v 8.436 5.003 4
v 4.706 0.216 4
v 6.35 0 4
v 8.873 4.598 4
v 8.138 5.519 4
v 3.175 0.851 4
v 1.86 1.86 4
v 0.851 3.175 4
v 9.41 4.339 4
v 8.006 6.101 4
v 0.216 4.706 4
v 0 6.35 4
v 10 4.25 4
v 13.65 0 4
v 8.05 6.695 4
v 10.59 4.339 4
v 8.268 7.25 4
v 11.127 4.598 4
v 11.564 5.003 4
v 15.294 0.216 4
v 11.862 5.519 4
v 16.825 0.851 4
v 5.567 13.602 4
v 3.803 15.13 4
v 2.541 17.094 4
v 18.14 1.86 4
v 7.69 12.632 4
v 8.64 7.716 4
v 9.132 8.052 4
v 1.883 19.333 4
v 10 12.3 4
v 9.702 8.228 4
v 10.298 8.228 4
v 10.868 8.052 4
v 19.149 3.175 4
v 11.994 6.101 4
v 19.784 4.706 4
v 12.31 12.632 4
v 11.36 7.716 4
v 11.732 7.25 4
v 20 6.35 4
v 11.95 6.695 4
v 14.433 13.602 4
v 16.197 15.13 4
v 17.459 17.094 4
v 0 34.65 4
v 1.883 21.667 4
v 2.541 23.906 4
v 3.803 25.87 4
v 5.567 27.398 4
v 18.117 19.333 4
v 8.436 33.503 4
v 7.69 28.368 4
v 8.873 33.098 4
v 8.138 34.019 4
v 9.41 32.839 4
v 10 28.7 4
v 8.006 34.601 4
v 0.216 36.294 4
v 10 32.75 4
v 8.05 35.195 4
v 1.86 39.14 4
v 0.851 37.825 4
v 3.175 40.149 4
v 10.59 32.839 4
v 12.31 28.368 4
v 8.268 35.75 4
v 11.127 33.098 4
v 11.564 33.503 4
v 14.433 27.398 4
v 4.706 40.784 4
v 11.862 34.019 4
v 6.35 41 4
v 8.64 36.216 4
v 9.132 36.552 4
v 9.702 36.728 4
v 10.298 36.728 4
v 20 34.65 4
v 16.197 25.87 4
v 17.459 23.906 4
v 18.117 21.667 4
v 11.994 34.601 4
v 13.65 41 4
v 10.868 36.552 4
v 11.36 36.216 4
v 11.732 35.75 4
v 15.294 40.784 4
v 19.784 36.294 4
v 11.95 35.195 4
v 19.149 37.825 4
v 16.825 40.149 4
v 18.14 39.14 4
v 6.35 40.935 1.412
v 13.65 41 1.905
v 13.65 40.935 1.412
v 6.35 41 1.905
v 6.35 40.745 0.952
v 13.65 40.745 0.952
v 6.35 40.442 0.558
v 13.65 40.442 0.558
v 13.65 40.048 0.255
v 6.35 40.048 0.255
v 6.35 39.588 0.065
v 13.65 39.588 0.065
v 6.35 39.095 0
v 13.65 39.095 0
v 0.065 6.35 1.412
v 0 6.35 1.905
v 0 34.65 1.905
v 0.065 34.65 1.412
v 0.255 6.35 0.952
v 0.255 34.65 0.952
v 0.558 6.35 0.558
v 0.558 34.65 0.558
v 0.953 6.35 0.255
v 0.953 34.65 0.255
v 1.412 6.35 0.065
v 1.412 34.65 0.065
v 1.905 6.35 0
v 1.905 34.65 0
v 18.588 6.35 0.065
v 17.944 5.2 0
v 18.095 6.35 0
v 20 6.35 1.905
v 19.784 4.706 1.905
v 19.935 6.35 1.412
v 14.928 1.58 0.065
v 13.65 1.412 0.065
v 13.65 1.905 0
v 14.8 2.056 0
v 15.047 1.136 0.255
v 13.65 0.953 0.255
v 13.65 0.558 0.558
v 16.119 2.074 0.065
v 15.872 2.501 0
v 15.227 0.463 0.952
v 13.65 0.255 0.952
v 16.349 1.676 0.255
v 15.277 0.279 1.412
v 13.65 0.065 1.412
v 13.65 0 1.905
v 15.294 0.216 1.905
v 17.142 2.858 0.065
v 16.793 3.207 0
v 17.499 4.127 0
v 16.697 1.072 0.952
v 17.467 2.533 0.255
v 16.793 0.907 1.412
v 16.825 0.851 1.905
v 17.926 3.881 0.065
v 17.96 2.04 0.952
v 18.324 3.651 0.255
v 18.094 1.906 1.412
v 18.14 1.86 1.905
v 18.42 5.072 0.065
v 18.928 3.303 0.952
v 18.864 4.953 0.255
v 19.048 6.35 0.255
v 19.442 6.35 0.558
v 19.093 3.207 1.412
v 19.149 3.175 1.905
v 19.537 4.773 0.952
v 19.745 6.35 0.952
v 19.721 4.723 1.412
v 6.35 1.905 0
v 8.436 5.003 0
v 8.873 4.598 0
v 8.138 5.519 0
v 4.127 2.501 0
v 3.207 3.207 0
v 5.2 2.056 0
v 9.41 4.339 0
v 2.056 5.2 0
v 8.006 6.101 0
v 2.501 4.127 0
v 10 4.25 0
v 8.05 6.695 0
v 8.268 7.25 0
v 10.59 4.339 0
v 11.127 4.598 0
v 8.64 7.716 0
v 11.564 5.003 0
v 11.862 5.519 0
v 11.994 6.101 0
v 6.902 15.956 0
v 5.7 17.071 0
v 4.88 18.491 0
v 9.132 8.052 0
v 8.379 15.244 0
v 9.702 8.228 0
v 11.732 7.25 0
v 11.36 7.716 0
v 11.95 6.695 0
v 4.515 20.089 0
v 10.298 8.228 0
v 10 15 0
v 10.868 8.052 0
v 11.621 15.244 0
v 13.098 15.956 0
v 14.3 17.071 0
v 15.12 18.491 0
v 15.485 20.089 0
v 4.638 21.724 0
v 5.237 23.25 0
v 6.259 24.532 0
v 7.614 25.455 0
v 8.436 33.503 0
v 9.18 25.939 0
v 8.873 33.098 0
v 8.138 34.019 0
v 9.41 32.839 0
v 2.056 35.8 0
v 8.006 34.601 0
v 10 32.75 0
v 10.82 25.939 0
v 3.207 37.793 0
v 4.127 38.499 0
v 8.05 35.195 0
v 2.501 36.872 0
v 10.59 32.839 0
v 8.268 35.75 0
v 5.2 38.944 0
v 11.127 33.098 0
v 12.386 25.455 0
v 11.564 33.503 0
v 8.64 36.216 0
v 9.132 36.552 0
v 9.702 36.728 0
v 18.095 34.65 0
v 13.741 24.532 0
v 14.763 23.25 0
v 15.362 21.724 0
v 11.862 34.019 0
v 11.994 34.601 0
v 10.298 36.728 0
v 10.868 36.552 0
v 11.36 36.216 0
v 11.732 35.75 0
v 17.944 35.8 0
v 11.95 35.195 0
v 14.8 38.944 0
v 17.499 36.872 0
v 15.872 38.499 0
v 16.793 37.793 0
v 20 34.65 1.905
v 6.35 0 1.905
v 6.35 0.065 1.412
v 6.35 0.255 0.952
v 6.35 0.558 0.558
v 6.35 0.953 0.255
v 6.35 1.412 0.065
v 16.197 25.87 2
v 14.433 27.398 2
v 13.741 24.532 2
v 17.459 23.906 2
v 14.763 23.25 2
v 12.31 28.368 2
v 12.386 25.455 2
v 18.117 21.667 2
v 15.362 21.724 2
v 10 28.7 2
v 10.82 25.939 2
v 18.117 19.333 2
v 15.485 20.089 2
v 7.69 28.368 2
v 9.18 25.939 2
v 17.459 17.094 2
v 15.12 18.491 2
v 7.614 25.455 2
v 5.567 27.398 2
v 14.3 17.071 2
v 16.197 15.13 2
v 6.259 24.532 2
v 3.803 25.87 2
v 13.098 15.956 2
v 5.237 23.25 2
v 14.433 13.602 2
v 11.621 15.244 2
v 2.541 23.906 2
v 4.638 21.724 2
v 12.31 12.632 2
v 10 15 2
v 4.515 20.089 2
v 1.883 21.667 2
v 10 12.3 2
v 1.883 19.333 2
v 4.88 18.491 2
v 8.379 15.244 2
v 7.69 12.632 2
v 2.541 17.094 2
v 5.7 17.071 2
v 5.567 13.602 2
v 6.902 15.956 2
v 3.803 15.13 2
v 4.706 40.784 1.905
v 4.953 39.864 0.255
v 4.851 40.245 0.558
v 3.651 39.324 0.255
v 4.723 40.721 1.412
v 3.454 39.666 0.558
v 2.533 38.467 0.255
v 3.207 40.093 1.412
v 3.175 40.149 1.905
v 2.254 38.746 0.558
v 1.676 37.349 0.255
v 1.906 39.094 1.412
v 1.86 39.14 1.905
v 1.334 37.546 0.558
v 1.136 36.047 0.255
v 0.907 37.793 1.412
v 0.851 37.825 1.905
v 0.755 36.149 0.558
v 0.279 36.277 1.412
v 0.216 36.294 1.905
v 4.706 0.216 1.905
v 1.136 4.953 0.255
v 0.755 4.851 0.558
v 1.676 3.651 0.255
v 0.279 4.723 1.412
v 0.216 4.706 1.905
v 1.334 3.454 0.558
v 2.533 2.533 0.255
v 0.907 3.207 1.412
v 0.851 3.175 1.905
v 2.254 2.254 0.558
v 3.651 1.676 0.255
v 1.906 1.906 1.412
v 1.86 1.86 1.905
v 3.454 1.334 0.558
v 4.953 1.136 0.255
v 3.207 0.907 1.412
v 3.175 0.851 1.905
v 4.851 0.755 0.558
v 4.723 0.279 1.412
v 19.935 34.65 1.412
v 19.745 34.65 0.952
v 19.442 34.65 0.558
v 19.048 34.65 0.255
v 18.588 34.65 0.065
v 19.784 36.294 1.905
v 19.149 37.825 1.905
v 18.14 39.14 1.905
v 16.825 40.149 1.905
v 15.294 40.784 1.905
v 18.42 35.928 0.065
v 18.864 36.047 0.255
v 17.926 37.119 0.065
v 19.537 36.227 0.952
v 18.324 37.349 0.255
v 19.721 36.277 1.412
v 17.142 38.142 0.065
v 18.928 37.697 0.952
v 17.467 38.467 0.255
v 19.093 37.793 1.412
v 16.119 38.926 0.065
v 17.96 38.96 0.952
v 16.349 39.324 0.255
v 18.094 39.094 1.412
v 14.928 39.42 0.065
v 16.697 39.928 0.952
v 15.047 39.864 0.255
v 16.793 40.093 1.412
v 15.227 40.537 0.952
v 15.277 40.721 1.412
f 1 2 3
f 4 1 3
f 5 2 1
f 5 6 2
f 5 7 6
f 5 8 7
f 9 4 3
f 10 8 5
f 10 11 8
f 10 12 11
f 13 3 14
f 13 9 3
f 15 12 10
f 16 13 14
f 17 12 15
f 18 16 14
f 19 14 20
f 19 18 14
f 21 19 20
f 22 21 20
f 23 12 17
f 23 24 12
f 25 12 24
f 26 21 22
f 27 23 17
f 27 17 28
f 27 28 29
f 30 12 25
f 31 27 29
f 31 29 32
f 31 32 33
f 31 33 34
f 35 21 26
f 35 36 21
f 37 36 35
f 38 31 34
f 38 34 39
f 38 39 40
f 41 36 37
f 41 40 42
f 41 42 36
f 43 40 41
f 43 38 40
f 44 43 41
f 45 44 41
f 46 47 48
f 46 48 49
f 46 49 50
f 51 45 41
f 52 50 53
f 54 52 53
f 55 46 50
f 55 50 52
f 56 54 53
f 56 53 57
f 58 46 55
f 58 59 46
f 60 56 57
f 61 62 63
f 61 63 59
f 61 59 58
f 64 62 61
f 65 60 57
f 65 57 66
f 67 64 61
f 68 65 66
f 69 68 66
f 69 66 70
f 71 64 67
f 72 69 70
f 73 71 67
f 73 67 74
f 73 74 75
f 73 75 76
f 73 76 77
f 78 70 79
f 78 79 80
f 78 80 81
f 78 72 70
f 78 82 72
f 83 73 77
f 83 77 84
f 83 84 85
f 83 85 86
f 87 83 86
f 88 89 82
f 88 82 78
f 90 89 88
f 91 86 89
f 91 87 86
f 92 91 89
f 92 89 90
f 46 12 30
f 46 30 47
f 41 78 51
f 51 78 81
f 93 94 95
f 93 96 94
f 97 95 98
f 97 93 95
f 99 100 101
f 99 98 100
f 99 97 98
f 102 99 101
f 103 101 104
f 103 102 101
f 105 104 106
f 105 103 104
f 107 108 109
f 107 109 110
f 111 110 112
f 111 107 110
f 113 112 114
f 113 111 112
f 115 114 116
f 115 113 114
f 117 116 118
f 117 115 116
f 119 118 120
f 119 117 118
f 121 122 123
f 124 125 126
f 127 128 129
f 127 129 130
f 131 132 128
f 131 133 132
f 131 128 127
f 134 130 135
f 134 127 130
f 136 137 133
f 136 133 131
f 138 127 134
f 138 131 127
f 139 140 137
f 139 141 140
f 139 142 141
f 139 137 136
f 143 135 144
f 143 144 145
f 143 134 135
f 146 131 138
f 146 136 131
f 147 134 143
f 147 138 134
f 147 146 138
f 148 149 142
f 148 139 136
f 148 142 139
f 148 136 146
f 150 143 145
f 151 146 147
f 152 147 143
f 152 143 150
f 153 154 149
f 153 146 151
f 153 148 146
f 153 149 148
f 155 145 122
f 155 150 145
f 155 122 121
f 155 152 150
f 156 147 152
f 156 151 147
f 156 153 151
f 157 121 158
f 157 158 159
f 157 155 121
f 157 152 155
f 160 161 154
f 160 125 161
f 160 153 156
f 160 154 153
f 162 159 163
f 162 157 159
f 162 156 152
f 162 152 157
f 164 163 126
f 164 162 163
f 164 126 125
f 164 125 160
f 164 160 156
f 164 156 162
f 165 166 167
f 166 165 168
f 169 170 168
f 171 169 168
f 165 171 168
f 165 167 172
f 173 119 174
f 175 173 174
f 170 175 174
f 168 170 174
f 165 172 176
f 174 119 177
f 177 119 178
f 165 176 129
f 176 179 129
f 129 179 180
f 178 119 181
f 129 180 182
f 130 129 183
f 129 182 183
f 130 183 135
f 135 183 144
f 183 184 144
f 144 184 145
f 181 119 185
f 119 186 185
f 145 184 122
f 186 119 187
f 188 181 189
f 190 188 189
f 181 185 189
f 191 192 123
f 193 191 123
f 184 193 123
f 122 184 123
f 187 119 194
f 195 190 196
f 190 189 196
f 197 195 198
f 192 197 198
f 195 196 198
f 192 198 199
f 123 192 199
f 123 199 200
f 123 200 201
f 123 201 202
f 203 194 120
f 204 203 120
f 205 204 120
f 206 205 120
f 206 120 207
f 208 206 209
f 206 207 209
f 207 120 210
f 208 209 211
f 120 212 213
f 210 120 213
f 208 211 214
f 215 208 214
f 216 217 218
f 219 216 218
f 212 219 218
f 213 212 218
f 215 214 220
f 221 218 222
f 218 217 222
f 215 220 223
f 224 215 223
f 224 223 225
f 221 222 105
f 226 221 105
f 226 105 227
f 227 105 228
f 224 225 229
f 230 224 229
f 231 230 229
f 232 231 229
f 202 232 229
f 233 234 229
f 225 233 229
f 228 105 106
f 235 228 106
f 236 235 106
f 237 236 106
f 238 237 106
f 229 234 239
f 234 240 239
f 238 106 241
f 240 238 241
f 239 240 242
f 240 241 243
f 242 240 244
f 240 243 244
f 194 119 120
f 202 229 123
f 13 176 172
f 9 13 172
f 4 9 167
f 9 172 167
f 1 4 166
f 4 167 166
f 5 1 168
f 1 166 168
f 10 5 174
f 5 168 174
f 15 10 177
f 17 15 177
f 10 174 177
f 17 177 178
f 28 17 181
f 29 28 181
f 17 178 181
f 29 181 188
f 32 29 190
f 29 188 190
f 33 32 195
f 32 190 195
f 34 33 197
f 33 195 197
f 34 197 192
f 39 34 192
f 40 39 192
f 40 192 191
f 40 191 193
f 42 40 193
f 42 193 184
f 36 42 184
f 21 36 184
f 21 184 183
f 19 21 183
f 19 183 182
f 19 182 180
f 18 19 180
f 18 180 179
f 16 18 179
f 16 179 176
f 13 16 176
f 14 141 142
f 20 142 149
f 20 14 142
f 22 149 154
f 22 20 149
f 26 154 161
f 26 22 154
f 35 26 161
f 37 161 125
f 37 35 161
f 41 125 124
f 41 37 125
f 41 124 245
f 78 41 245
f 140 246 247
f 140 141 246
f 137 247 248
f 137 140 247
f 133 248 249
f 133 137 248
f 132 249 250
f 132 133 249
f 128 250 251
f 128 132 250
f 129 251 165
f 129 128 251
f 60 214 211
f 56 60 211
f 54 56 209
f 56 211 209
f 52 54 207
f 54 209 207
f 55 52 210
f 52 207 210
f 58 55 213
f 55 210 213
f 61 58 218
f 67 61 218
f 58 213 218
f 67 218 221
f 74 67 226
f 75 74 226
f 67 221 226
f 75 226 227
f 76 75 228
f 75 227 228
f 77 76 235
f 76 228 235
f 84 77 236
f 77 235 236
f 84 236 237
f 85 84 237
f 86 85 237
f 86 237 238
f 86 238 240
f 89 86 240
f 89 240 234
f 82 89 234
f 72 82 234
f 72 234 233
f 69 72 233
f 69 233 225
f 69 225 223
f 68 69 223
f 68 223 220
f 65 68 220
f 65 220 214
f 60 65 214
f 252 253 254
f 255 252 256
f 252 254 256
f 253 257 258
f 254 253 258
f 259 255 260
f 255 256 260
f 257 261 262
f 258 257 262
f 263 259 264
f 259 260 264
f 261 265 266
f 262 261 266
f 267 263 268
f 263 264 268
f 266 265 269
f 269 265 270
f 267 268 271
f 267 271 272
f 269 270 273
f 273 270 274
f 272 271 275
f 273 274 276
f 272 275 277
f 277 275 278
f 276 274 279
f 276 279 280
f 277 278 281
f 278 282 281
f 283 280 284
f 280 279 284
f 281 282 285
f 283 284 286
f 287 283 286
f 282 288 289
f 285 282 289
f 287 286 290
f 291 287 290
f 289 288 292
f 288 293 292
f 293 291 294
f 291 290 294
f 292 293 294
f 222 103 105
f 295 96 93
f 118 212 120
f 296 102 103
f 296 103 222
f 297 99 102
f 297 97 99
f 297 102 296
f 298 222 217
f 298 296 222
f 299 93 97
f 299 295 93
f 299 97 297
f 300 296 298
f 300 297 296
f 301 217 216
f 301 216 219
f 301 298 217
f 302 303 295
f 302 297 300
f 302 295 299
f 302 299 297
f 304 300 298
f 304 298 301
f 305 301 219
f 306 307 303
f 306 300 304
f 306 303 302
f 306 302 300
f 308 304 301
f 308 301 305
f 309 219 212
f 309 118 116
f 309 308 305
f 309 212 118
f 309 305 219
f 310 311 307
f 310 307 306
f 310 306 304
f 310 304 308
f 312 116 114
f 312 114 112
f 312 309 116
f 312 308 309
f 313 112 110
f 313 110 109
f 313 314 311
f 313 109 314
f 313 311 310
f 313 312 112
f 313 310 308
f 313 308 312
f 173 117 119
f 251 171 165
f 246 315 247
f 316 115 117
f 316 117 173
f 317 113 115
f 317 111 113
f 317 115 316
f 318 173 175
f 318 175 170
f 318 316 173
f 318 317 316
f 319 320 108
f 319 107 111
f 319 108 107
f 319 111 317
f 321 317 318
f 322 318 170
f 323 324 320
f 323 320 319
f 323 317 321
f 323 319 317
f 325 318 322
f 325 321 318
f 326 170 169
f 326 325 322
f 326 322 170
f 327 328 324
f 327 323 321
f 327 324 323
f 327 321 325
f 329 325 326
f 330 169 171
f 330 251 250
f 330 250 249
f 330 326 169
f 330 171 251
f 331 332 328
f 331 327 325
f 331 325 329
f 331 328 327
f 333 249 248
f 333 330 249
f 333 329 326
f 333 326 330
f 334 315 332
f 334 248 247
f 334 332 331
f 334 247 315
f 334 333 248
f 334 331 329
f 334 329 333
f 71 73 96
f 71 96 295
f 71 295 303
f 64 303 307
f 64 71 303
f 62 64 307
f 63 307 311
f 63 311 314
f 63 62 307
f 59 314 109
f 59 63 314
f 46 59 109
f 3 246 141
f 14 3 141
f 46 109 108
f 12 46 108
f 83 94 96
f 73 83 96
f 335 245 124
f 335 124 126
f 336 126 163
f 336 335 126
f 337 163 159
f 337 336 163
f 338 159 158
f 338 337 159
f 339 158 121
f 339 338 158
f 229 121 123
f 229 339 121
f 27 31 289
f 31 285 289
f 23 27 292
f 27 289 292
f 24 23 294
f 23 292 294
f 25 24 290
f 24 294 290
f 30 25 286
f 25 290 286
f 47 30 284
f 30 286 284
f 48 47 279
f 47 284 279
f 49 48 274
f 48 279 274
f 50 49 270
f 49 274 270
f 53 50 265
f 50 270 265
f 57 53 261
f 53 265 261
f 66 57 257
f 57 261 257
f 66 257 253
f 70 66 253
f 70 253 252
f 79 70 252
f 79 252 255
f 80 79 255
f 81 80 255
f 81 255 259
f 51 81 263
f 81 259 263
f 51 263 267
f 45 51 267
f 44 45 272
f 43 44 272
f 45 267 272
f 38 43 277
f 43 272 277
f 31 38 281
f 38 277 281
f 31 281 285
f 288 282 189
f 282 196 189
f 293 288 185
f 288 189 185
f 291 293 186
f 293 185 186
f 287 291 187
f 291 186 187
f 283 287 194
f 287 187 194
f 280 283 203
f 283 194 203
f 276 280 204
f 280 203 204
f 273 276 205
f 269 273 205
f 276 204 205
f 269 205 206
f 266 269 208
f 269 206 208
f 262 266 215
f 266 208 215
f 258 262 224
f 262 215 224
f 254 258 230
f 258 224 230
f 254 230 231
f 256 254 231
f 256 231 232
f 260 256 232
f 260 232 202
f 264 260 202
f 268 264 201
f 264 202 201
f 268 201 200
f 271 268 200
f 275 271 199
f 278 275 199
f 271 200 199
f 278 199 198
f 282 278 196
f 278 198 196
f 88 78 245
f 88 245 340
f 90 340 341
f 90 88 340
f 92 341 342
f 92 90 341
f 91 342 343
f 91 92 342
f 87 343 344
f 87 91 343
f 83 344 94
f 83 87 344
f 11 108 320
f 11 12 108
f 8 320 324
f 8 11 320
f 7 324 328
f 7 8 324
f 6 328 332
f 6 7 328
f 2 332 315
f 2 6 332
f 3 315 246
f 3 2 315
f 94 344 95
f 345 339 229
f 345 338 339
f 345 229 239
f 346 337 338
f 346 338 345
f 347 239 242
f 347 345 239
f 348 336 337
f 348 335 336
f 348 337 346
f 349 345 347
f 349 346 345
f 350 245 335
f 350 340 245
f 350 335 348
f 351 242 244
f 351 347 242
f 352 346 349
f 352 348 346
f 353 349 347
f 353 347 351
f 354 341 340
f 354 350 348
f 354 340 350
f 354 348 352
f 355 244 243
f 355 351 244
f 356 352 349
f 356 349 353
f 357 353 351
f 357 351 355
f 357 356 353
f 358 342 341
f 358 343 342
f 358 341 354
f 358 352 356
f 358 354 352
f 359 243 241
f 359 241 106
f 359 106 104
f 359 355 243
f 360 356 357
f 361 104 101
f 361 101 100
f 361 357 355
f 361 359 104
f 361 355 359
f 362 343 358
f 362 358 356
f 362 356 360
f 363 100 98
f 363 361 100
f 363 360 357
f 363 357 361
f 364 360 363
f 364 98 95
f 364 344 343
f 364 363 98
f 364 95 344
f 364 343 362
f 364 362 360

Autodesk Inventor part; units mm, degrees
ref_plane "YZ Plane" through (0, 0, 0) normal (1, 0, 0) x (0, 1, 0)
ref_plane "XZ Plane" through (0, 0, 0) normal (0, 1, 0) x (-1, 0, 0)
ref_plane "XY Plane" through (0, 0, 0) normal (0, 0, 1) x (1, 0, 0)
sketch "Sketch1" plane through (0, 0, 0) normal (0, 0, 1) x (1, 0, 0)
  line L0 (0, 0) -> (20, 0)
  line L1 (20, 0) -> (20, 41)
  line L2 (20, 41) -> (0, 41)
  line L3 (0, 41) -> (0, 0)
  dimension "d0" = 20
  dimension "d1" = 41
extrude "Extrusion1" add sketch "Sketch1" along normal blind 4
sketch "Sketch2" plane through (0, 0, 4) normal (0, 0, 1) x (1, 0, 0)
  line L0 (20, 0) -> (20, 41) projected
  line L1 (20, 41) -> (0, 41) projected
  point P0 (0, 0)
  point P1 (10, 20.5)
  dimension "d11" = 10
  dimension "d12" = 20.5
hole "Hole1" at (10, 20.5, 4) direction (0, 0, -1) diameter 11 end through all counterbore diameter 16.4 counterbore depth 2
sketch "Sketch3" plane through (0, 0, 4) normal (0, 0, 1) x (1, 0, 0)
  line L0 (20, 0) -> (20, 41) projected
  line L1 (20, 41) -> (0, 41) projected
  point P0 (0, 0)
  point P1 (10, 34.75)
  dimension "d20" = 10
  dimension "d21" = 6.25
hole "Hole2" at (10, 34.75, 4) direction (0, 0, -1) diameter 4 end through all
sketch "Sketch4" plane through (0, 0, 4) normal (0, 0, 1) x (1, 0, 0)
  line L0 (20, 0) -> (20, 41) projected
  line L1 (0, 0) -> (20, 0) projected
  point P0 (10, 6.25)
  dimension "d29" = 10
  dimension "d30" = 6.25
hole "Hole3" at (10, 6.25, 4) direction (0, 0, -1) diameter 4 end through all
fillet "Fillet1" radius 6.35 1 edges at (20, 41, 2)
fillet "Fillet2" radius 6.35 1 edges at (0, 41, 2)
fillet "Fillet3" radius 6.35 1 edges at (20, 0, 2)
fillet "Fillet4" radius 6.35 1 edges at (0, 0, 2)
fillet "Fillet5" radius 1.905 8 edges at (10, 41, 0) (1.8599, 39.1401, 0) (0, 20.5, 0) (1.8599, 1.8599, 0) (10, 0, 0) (18.1401, 1.8599, 0) (20, 20.5, 0) (18.1401, 39.1401, 0)
properties part number "sides"
